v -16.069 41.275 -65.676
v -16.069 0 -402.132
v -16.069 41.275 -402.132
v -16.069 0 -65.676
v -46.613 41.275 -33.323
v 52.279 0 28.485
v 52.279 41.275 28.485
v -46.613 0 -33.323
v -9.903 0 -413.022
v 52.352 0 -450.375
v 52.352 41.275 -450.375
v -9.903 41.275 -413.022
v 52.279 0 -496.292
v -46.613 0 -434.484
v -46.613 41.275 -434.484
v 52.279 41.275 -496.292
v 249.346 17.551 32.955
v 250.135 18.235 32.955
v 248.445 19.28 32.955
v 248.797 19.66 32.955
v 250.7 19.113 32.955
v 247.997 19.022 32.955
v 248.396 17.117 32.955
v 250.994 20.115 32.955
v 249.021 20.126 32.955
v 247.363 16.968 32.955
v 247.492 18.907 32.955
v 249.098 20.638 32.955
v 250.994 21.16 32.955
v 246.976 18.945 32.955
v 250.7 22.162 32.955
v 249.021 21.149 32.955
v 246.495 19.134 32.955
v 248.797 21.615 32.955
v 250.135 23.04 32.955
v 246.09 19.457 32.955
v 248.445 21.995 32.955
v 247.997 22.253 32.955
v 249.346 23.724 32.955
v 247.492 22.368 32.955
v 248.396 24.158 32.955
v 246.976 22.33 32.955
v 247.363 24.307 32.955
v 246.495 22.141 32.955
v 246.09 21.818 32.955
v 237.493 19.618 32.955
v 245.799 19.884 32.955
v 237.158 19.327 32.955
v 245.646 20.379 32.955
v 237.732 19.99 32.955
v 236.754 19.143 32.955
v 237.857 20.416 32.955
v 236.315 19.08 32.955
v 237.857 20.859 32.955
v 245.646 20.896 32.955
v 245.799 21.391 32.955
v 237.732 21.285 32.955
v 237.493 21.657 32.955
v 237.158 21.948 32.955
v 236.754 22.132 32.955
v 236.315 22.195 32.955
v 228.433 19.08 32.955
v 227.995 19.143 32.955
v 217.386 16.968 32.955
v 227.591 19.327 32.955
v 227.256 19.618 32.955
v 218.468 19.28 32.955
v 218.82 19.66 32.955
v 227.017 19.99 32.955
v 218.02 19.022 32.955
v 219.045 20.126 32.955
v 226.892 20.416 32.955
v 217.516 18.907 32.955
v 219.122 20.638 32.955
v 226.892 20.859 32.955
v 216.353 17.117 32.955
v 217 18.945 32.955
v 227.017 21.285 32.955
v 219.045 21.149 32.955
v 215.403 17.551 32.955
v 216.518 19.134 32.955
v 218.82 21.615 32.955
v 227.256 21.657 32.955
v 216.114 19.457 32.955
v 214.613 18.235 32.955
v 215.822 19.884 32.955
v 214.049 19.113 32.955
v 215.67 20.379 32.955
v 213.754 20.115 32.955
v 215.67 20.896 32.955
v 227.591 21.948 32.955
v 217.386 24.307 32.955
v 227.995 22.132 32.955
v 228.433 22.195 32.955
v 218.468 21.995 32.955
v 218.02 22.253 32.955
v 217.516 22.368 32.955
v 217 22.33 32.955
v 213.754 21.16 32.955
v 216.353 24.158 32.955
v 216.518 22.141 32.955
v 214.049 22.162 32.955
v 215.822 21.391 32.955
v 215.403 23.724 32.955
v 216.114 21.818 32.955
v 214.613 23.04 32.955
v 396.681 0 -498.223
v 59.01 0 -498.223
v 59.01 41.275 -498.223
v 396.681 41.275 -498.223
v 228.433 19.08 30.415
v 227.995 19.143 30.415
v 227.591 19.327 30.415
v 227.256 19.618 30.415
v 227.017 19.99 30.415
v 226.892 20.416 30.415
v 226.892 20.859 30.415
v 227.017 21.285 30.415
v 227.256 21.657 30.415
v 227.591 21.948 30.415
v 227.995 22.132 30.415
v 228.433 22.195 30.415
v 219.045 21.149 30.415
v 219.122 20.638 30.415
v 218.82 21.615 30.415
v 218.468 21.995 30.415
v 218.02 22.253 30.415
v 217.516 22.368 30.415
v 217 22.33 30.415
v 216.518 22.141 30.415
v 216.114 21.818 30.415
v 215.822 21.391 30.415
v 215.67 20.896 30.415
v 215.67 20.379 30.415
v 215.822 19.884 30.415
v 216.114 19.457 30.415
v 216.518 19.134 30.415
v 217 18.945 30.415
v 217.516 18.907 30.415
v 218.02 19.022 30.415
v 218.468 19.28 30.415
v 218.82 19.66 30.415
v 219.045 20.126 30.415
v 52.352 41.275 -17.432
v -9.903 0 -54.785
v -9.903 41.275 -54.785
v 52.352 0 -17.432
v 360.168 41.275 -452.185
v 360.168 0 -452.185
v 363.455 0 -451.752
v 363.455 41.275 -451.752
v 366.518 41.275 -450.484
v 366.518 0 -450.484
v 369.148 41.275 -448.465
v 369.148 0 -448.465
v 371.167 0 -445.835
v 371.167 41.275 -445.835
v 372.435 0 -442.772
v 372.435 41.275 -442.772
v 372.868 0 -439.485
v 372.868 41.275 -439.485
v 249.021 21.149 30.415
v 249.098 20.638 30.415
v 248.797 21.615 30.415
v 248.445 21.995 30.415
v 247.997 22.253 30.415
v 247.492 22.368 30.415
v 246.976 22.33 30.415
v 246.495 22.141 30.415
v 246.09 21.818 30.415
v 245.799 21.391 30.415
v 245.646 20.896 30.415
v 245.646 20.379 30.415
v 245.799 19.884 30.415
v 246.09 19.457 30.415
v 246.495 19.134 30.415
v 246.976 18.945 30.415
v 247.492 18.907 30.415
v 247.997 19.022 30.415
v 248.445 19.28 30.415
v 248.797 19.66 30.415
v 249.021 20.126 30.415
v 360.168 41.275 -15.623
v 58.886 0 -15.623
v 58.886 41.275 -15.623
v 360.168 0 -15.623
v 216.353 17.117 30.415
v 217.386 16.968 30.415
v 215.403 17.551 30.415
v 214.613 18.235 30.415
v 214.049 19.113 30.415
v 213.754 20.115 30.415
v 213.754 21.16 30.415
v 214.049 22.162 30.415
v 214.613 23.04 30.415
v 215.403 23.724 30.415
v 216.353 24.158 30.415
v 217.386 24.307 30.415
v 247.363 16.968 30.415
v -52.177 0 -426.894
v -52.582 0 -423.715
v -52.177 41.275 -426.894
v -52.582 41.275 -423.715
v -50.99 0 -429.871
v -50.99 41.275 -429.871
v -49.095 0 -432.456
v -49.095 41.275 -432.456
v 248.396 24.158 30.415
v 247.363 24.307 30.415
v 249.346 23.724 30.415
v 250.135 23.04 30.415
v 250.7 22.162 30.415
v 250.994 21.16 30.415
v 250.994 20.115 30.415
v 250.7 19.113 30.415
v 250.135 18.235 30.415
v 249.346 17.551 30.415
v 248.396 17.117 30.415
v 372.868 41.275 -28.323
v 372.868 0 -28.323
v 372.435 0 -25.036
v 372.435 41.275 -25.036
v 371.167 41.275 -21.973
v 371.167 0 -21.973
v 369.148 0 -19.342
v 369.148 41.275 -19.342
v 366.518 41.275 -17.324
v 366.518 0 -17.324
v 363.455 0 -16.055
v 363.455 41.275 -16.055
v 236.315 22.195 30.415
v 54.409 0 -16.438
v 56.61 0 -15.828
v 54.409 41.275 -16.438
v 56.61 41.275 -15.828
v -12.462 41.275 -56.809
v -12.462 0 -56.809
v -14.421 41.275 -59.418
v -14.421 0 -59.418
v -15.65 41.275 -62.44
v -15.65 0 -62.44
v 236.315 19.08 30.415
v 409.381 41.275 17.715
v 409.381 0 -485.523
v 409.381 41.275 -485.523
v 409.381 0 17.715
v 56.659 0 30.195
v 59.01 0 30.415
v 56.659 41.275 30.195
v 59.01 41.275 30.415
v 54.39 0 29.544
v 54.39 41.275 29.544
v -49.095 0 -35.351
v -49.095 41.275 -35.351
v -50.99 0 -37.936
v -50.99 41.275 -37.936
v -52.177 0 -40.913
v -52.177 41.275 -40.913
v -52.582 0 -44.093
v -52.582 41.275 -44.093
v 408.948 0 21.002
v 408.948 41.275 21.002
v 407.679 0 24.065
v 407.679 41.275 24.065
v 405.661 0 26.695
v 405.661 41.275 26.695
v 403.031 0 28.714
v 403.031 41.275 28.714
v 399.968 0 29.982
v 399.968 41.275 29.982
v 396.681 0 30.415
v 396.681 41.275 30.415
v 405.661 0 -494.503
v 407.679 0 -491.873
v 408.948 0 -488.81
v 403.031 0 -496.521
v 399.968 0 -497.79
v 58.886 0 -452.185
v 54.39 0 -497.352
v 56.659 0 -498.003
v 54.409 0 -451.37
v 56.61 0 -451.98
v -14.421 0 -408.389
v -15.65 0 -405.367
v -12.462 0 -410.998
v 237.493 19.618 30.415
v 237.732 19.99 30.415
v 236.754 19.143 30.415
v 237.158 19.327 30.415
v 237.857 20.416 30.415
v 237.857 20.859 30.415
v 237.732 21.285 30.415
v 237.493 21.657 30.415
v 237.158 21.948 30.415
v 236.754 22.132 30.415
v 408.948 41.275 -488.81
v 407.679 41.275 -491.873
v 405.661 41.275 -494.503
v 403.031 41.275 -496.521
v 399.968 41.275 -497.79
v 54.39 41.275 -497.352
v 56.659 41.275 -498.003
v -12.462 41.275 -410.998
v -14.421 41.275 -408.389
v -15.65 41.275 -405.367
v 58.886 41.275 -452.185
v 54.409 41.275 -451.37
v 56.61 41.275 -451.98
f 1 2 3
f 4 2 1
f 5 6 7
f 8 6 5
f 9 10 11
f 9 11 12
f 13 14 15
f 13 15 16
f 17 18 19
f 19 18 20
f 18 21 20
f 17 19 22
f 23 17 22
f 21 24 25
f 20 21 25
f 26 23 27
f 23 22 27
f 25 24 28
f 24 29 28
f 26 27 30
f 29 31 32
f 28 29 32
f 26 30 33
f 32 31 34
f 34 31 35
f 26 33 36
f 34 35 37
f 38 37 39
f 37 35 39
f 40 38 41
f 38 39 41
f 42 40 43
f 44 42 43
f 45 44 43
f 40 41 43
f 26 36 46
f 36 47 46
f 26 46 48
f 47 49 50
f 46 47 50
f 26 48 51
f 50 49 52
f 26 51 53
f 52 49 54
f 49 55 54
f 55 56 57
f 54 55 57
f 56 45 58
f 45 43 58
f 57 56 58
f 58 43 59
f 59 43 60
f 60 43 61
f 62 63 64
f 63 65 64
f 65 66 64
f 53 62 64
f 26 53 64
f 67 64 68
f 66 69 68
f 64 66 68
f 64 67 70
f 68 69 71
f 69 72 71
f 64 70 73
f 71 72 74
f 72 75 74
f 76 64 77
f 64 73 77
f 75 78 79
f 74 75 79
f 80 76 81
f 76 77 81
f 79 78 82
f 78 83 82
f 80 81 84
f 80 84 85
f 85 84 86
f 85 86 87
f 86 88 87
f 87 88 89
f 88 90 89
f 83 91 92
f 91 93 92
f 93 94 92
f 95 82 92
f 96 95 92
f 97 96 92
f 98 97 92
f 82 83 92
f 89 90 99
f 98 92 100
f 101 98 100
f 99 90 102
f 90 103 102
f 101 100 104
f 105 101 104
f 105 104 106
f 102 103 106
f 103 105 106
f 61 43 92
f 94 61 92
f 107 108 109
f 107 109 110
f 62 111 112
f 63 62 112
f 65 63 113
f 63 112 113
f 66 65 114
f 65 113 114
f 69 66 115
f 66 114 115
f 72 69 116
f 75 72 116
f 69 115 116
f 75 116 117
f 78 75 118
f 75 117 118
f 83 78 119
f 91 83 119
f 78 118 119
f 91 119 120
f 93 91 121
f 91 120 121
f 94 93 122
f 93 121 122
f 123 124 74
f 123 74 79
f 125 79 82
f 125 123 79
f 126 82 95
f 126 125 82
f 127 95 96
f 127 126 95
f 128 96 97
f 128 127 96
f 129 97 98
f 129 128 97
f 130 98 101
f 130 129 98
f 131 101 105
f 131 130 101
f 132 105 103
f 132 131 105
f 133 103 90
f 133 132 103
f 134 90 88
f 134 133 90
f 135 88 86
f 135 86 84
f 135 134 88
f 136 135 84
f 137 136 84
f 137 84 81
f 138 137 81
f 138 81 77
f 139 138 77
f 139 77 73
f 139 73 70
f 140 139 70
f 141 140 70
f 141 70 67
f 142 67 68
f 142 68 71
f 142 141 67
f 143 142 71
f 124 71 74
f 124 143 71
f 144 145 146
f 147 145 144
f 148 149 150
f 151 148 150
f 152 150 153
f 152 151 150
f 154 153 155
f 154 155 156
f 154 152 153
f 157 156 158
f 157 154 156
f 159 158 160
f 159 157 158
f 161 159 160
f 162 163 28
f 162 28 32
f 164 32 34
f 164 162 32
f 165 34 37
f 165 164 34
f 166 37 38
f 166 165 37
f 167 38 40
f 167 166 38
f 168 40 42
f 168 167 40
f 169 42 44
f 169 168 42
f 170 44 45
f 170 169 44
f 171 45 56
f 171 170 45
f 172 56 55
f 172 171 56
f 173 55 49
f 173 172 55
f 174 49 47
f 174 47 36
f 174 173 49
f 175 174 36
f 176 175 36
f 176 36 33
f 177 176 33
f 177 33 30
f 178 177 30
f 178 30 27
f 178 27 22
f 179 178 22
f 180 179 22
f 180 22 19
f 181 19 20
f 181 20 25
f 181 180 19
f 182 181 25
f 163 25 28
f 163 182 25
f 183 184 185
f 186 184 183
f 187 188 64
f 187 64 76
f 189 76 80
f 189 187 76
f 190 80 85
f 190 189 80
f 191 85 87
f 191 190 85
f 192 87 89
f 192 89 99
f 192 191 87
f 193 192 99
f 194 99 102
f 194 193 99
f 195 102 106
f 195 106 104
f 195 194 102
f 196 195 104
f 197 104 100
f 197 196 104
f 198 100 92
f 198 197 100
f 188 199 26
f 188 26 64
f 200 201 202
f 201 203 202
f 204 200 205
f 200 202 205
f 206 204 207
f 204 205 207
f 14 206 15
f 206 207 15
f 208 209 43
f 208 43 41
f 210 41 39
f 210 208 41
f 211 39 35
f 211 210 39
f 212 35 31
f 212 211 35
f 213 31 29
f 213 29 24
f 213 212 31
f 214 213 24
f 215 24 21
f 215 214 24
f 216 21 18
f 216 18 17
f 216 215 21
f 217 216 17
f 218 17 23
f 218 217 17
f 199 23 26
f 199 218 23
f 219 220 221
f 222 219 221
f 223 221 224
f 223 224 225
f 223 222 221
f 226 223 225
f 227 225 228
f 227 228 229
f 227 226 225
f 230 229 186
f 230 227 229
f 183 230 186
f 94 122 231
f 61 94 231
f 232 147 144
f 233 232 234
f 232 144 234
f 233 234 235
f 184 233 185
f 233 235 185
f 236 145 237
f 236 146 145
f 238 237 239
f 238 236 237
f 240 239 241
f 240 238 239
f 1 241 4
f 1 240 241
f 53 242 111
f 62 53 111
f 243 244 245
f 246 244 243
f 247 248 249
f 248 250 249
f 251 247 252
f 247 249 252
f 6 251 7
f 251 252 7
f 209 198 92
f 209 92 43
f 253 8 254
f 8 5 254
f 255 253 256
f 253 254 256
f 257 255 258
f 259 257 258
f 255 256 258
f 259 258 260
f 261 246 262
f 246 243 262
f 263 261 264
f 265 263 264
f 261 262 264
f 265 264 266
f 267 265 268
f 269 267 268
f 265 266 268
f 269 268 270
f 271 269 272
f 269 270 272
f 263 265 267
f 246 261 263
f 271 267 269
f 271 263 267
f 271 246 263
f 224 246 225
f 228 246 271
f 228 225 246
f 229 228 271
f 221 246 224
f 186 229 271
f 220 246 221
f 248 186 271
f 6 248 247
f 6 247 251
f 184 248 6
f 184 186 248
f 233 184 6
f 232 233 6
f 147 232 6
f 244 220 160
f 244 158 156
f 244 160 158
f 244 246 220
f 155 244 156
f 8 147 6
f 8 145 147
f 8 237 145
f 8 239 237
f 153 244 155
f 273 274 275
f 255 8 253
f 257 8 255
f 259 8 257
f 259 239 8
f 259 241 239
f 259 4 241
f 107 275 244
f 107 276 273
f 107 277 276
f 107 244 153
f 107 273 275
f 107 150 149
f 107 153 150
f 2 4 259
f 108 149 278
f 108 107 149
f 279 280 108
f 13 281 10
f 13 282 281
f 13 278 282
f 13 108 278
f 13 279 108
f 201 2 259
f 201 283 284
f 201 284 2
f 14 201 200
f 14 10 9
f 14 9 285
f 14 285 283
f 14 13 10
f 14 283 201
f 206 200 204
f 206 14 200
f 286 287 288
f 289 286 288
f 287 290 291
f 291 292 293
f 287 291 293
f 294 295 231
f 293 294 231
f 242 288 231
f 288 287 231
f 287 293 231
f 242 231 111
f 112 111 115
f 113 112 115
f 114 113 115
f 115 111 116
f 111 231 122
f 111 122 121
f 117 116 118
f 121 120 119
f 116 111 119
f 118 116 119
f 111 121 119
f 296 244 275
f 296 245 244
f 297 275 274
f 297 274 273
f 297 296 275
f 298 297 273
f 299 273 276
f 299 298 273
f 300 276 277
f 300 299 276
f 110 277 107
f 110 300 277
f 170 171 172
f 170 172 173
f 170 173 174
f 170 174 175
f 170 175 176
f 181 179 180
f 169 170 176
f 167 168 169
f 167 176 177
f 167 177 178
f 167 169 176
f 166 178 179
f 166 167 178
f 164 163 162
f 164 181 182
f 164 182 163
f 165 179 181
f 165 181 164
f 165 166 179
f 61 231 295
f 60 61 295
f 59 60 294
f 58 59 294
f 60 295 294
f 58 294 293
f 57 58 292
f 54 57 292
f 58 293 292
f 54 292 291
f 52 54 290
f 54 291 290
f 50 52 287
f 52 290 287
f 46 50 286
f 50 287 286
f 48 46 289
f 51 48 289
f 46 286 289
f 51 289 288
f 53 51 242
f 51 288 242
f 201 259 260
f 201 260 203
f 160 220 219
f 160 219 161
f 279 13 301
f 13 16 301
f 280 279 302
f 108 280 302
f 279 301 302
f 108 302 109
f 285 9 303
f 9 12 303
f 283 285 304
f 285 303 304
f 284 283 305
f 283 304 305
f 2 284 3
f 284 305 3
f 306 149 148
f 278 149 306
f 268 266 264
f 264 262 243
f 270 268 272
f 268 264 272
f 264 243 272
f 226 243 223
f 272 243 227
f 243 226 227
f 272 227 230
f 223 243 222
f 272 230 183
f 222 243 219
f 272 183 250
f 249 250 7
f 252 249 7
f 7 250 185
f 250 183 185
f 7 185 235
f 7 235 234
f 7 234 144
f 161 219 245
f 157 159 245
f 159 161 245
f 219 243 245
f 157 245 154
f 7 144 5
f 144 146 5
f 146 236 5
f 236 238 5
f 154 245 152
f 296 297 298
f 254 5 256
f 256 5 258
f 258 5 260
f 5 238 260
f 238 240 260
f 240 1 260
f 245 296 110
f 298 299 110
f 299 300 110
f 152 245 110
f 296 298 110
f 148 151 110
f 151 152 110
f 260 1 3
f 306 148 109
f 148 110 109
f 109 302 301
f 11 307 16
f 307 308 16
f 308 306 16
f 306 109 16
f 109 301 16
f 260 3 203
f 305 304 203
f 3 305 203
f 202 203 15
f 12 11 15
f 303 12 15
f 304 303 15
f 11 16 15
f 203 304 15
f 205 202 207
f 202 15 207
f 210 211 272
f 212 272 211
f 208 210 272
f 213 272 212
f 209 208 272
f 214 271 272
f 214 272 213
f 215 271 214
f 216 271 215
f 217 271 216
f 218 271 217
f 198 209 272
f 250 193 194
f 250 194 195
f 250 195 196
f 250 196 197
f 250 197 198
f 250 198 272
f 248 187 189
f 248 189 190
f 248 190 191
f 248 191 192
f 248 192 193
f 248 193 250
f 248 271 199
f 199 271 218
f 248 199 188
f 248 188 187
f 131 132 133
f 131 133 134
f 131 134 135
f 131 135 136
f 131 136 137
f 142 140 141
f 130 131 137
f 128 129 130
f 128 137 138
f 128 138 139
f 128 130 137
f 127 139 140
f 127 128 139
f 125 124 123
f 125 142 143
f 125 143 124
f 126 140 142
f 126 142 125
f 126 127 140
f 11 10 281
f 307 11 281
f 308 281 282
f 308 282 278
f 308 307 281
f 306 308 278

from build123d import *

# Parameters (mm, degrees)
SALIENTE_EXTRUIR2_DEPTH = 41.275
CROQUIS2_5_OUTSIDE_W    = 604.615
CROQUIS2_5_OUTSIDE_H    = 671.29
CORTAR_EXTRUIR2_DEPTH   = 41.275
SALIENTE_EXTRUIR4_DEPTH = 2.54
CROQUIS3_5_OUTSIDE_W    = 604.997
CROQUIS3_5_OUTSIDE_H    = 184.309
CROQUIS3_5_OUTSIDE_R    = 1.735738664
CORTAR_EXTRUIR3_DEPTH   = 2.54
REDONDEO1_R             = 12.7
REDONDEO2_R             = 12.7
REDONDEO3_R             = 12.7
REDONDEO4_R             = 12.7
REDONDEO5_R             = 12.7
REDONDEO6_R             = 12.7
REDONDEO7_R             = 12.7
REDONDEO8_R             = 12.7
REDONDEO9_R             = 12.7
REDONDEO10_R            = 12.7
REDONDEO11_R            = 12.7
REDONDEO12_R            = 12.7


with BuildPart() as part:
    # Croquis2 → Saliente-Extruir2 (new body)
    with BuildSketch(Plane(origin=(0, 0, 0), x_dir=(1, 0, 0), z_dir=(0, 1, 0))):
        Polygon((409.380647902, 498.22250712), (409.380647902, -30.41499288), (55.368147902, -30.41499288), (-52.581852098, 37.05375712), (-52.581852098, 430.75375712), (55.368147902, 498.22250712), align=None)
    extrude(amount=SALIENTE_EXTRUIR2_DEPTH)

    # Croquis2<5> outside → Cortar-Extruir2 (cut)
    # profile 1 of 2: a face of its own
    with BuildSketch(Plane(origin=(0, 0, 0), x_dir=(1, 0, 0), z_dir=(0, 1, 0))):
        with Locations((178.3995, 233.904)):
            Rectangle(CROQUIS2_5_OUTSIDE_W, CROQUIS2_5_OUTSIDE_H)
        Polygon((409.380647902, 498.22250712), (409.380647902, -30.41499288), (55.368147902, -30.41499288), (-52.581852098, 37.05375712), (-52.581852098, 430.75375712), (55.368147902, 498.22250712), align=None, mode=Mode.SUBTRACT)
    # profile 2 of 2: a face of its own
    with BuildSketch(Plane(origin=(0, 0, 0), x_dir=(1, 0, 0), z_dir=(0, 1, 0))):
        Polygon((55.368147902, 15.62250712), (372.868147902, 15.62250712), (372.868147902, 452.18500712), (55.368147902, 452.18500712), (-16.069352098, 409.32250712), (-16.069352098, 58.48500712), align=None)
    extrude(amount=CORTAR_EXTRUIR2_DEPTH, mode=Mode.SUBTRACT)

    # Croquis3 → Saliente-Extruir4 (add)
    with BuildSketch(Plane.XY.offset(30.41499288)):
        with BuildLine():
            Line((217.386255897, 24.306608413), (247.362539906, 24.306608413))
            ThreePointArc((247.362539906, 24.306608413), (251.03164832, 20.6375), (247.362539906, 16.968391587))
            Line((247.362539906, 16.968391587), (217.386255897, 16.968391587))
            ThreePointArc((217.386255897, 16.968391587), (213.717147484, 20.6375), (217.386255897, 24.306608413))
        make_face()
    extrude(amount=SALIENTE_EXTRUIR4_DEPTH)

    # Croquis3<5> outside → Cortar-Extruir3 (cut)
    # profile 1 of 4: a face of its own
    with BuildSketch(Plane.XY.offset(30.41499288)):
        with Locations((178.3995, 20.6375)):
            Rectangle(CROQUIS3_5_OUTSIDE_W, CROQUIS3_5_OUTSIDE_H)
        with BuildLine():
            Line((217.386255897, 24.306608413), (247.362539906, 24.306608413))
            ThreePointArc((247.362539906, 24.306608413), (251.03164832, 20.6375), (247.362539906, 16.968391587))
            Line((247.362539906, 16.968391587), (217.386255897, 16.968391587))
            ThreePointArc((217.386255897, 16.968391587), (213.717147484, 20.6375), (217.386255897, 24.306608413))
        make_face(mode=Mode.SUBTRACT)
    # profile 2 of 4: a face of its own
    with BuildSketch(Plane.XY.offset(30.41499288)):
        with Locations((217.386255897, 20.6375)):
            Circle(CROQUIS3_5_OUTSIDE_R)
    # profile 3 of 4: a face of its own
    with BuildSketch(Plane.XY.offset(30.41499288)):
        with Locations((247.362539906, 20.6375)):
            Circle(CROQUIS3_5_OUTSIDE_R)
    # profile 4 of 4: a face of its own
    with BuildSketch(Plane.XY.offset(30.41499288)):
        with BuildLine():
            Line((228.433365542, 22.195071447), (236.315430261, 22.195071447))
            ThreePointArc((236.315430261, 22.195071447), (237.873001708, 20.6375), (236.315430261, 19.079928553))
            Line((236.315430261, 19.079928553), (228.433365542, 19.079928553))
            ThreePointArc((228.433365542, 19.079928553), (226.875794095, 20.6375), (228.433365542, 22.195071447))
        make_face()
    extrude(amount=CORTAR_EXTRUIR3_DEPTH, mode=Mode.SUBTRACT)

    # Redondeo1
    redondeo1_edges = [part.edges().sort_by_distance(p)[0] for p in [
        (372.868147902, 20.6375, -452.18500712),
    ]]
    fillet(redondeo1_edges, radius=REDONDEO1_R)

    # Redondeo2
    redondeo2_edges = [part.edges().sort_by_distance(p)[0] for p in [
        (372.868147902, 20.6375, -15.62250712),
    ]]
    fillet(redondeo2_edges, radius=REDONDEO2_R)

    # Redondeo3
    redondeo3_edges = [part.edges().sort_by_distance(p)[0] for p in [
        (-16.069352098, 20.6375, -409.32250712),
    ]]
    fillet(redondeo3_edges, radius=REDONDEO3_R)

    # Redondeo4
    redondeo4_edges = [part.edges().sort_by_distance(p)[0] for p in [
        (55.368147902, 20.6375, -452.18500712),
    ]]
    fillet(redondeo4_edges, radius=REDONDEO4_R)

    # Redondeo5
    redondeo5_edges = [part.edges().sort_by_distance(p)[0] for p in [
        (55.368147902, 20.6375, -15.62250712),
    ]]
    fillet(redondeo5_edges, radius=REDONDEO5_R)

    # Redondeo6
    redondeo6_edges = [part.edges().sort_by_distance(p)[0] for p in [
        (-16.069352098, 20.6375, -58.48500712),
    ]]
    fillet(redondeo6_edges, radius=REDONDEO6_R)

    # Redondeo7
    redondeo7_edges = [part.edges().sort_by_distance(p)[0] for p in [
        (55.368147902, 20.6375, 30.41499288),
    ]]
    fillet(redondeo7_edges, radius=REDONDEO7_R)

    # Redondeo8
    redondeo8_edges = [part.edges().sort_by_distance(p)[0] for p in [
        (-52.581852098, 20.6375, -37.05375712),
    ]]
    fillet(redondeo8_edges, radius=REDONDEO8_R)

    # Redondeo9
    redondeo9_edges = [part.edges().sort_by_distance(p)[0] for p in [
        (-52.581852098, 20.6375, -430.75375712),
    ]]
    fillet(redondeo9_edges, radius=REDONDEO9_R)

    # Redondeo10
    redondeo10_edges = [part.edges().sort_by_distance(p)[0] for p in [
        (55.368147902, 20.6375, -498.22250712),
    ]]
    fillet(redondeo10_edges, radius=REDONDEO10_R)

    # Redondeo11
    redondeo11_edges = [part.edges().sort_by_distance(p)[0] for p in [
        (409.380647902, 20.6375, 30.41499288),
    ]]
    fillet(redondeo11_edges, radius=REDONDEO11_R)

    # Redondeo12
    redondeo12_edges = [part.edges().sort_by_distance(p)[0] for p in [
        (409.380647902, 20.6375, -498.22250712),
    ]]
    fillet(redondeo12_edges, radius=REDONDEO12_R)


solid = part.part
